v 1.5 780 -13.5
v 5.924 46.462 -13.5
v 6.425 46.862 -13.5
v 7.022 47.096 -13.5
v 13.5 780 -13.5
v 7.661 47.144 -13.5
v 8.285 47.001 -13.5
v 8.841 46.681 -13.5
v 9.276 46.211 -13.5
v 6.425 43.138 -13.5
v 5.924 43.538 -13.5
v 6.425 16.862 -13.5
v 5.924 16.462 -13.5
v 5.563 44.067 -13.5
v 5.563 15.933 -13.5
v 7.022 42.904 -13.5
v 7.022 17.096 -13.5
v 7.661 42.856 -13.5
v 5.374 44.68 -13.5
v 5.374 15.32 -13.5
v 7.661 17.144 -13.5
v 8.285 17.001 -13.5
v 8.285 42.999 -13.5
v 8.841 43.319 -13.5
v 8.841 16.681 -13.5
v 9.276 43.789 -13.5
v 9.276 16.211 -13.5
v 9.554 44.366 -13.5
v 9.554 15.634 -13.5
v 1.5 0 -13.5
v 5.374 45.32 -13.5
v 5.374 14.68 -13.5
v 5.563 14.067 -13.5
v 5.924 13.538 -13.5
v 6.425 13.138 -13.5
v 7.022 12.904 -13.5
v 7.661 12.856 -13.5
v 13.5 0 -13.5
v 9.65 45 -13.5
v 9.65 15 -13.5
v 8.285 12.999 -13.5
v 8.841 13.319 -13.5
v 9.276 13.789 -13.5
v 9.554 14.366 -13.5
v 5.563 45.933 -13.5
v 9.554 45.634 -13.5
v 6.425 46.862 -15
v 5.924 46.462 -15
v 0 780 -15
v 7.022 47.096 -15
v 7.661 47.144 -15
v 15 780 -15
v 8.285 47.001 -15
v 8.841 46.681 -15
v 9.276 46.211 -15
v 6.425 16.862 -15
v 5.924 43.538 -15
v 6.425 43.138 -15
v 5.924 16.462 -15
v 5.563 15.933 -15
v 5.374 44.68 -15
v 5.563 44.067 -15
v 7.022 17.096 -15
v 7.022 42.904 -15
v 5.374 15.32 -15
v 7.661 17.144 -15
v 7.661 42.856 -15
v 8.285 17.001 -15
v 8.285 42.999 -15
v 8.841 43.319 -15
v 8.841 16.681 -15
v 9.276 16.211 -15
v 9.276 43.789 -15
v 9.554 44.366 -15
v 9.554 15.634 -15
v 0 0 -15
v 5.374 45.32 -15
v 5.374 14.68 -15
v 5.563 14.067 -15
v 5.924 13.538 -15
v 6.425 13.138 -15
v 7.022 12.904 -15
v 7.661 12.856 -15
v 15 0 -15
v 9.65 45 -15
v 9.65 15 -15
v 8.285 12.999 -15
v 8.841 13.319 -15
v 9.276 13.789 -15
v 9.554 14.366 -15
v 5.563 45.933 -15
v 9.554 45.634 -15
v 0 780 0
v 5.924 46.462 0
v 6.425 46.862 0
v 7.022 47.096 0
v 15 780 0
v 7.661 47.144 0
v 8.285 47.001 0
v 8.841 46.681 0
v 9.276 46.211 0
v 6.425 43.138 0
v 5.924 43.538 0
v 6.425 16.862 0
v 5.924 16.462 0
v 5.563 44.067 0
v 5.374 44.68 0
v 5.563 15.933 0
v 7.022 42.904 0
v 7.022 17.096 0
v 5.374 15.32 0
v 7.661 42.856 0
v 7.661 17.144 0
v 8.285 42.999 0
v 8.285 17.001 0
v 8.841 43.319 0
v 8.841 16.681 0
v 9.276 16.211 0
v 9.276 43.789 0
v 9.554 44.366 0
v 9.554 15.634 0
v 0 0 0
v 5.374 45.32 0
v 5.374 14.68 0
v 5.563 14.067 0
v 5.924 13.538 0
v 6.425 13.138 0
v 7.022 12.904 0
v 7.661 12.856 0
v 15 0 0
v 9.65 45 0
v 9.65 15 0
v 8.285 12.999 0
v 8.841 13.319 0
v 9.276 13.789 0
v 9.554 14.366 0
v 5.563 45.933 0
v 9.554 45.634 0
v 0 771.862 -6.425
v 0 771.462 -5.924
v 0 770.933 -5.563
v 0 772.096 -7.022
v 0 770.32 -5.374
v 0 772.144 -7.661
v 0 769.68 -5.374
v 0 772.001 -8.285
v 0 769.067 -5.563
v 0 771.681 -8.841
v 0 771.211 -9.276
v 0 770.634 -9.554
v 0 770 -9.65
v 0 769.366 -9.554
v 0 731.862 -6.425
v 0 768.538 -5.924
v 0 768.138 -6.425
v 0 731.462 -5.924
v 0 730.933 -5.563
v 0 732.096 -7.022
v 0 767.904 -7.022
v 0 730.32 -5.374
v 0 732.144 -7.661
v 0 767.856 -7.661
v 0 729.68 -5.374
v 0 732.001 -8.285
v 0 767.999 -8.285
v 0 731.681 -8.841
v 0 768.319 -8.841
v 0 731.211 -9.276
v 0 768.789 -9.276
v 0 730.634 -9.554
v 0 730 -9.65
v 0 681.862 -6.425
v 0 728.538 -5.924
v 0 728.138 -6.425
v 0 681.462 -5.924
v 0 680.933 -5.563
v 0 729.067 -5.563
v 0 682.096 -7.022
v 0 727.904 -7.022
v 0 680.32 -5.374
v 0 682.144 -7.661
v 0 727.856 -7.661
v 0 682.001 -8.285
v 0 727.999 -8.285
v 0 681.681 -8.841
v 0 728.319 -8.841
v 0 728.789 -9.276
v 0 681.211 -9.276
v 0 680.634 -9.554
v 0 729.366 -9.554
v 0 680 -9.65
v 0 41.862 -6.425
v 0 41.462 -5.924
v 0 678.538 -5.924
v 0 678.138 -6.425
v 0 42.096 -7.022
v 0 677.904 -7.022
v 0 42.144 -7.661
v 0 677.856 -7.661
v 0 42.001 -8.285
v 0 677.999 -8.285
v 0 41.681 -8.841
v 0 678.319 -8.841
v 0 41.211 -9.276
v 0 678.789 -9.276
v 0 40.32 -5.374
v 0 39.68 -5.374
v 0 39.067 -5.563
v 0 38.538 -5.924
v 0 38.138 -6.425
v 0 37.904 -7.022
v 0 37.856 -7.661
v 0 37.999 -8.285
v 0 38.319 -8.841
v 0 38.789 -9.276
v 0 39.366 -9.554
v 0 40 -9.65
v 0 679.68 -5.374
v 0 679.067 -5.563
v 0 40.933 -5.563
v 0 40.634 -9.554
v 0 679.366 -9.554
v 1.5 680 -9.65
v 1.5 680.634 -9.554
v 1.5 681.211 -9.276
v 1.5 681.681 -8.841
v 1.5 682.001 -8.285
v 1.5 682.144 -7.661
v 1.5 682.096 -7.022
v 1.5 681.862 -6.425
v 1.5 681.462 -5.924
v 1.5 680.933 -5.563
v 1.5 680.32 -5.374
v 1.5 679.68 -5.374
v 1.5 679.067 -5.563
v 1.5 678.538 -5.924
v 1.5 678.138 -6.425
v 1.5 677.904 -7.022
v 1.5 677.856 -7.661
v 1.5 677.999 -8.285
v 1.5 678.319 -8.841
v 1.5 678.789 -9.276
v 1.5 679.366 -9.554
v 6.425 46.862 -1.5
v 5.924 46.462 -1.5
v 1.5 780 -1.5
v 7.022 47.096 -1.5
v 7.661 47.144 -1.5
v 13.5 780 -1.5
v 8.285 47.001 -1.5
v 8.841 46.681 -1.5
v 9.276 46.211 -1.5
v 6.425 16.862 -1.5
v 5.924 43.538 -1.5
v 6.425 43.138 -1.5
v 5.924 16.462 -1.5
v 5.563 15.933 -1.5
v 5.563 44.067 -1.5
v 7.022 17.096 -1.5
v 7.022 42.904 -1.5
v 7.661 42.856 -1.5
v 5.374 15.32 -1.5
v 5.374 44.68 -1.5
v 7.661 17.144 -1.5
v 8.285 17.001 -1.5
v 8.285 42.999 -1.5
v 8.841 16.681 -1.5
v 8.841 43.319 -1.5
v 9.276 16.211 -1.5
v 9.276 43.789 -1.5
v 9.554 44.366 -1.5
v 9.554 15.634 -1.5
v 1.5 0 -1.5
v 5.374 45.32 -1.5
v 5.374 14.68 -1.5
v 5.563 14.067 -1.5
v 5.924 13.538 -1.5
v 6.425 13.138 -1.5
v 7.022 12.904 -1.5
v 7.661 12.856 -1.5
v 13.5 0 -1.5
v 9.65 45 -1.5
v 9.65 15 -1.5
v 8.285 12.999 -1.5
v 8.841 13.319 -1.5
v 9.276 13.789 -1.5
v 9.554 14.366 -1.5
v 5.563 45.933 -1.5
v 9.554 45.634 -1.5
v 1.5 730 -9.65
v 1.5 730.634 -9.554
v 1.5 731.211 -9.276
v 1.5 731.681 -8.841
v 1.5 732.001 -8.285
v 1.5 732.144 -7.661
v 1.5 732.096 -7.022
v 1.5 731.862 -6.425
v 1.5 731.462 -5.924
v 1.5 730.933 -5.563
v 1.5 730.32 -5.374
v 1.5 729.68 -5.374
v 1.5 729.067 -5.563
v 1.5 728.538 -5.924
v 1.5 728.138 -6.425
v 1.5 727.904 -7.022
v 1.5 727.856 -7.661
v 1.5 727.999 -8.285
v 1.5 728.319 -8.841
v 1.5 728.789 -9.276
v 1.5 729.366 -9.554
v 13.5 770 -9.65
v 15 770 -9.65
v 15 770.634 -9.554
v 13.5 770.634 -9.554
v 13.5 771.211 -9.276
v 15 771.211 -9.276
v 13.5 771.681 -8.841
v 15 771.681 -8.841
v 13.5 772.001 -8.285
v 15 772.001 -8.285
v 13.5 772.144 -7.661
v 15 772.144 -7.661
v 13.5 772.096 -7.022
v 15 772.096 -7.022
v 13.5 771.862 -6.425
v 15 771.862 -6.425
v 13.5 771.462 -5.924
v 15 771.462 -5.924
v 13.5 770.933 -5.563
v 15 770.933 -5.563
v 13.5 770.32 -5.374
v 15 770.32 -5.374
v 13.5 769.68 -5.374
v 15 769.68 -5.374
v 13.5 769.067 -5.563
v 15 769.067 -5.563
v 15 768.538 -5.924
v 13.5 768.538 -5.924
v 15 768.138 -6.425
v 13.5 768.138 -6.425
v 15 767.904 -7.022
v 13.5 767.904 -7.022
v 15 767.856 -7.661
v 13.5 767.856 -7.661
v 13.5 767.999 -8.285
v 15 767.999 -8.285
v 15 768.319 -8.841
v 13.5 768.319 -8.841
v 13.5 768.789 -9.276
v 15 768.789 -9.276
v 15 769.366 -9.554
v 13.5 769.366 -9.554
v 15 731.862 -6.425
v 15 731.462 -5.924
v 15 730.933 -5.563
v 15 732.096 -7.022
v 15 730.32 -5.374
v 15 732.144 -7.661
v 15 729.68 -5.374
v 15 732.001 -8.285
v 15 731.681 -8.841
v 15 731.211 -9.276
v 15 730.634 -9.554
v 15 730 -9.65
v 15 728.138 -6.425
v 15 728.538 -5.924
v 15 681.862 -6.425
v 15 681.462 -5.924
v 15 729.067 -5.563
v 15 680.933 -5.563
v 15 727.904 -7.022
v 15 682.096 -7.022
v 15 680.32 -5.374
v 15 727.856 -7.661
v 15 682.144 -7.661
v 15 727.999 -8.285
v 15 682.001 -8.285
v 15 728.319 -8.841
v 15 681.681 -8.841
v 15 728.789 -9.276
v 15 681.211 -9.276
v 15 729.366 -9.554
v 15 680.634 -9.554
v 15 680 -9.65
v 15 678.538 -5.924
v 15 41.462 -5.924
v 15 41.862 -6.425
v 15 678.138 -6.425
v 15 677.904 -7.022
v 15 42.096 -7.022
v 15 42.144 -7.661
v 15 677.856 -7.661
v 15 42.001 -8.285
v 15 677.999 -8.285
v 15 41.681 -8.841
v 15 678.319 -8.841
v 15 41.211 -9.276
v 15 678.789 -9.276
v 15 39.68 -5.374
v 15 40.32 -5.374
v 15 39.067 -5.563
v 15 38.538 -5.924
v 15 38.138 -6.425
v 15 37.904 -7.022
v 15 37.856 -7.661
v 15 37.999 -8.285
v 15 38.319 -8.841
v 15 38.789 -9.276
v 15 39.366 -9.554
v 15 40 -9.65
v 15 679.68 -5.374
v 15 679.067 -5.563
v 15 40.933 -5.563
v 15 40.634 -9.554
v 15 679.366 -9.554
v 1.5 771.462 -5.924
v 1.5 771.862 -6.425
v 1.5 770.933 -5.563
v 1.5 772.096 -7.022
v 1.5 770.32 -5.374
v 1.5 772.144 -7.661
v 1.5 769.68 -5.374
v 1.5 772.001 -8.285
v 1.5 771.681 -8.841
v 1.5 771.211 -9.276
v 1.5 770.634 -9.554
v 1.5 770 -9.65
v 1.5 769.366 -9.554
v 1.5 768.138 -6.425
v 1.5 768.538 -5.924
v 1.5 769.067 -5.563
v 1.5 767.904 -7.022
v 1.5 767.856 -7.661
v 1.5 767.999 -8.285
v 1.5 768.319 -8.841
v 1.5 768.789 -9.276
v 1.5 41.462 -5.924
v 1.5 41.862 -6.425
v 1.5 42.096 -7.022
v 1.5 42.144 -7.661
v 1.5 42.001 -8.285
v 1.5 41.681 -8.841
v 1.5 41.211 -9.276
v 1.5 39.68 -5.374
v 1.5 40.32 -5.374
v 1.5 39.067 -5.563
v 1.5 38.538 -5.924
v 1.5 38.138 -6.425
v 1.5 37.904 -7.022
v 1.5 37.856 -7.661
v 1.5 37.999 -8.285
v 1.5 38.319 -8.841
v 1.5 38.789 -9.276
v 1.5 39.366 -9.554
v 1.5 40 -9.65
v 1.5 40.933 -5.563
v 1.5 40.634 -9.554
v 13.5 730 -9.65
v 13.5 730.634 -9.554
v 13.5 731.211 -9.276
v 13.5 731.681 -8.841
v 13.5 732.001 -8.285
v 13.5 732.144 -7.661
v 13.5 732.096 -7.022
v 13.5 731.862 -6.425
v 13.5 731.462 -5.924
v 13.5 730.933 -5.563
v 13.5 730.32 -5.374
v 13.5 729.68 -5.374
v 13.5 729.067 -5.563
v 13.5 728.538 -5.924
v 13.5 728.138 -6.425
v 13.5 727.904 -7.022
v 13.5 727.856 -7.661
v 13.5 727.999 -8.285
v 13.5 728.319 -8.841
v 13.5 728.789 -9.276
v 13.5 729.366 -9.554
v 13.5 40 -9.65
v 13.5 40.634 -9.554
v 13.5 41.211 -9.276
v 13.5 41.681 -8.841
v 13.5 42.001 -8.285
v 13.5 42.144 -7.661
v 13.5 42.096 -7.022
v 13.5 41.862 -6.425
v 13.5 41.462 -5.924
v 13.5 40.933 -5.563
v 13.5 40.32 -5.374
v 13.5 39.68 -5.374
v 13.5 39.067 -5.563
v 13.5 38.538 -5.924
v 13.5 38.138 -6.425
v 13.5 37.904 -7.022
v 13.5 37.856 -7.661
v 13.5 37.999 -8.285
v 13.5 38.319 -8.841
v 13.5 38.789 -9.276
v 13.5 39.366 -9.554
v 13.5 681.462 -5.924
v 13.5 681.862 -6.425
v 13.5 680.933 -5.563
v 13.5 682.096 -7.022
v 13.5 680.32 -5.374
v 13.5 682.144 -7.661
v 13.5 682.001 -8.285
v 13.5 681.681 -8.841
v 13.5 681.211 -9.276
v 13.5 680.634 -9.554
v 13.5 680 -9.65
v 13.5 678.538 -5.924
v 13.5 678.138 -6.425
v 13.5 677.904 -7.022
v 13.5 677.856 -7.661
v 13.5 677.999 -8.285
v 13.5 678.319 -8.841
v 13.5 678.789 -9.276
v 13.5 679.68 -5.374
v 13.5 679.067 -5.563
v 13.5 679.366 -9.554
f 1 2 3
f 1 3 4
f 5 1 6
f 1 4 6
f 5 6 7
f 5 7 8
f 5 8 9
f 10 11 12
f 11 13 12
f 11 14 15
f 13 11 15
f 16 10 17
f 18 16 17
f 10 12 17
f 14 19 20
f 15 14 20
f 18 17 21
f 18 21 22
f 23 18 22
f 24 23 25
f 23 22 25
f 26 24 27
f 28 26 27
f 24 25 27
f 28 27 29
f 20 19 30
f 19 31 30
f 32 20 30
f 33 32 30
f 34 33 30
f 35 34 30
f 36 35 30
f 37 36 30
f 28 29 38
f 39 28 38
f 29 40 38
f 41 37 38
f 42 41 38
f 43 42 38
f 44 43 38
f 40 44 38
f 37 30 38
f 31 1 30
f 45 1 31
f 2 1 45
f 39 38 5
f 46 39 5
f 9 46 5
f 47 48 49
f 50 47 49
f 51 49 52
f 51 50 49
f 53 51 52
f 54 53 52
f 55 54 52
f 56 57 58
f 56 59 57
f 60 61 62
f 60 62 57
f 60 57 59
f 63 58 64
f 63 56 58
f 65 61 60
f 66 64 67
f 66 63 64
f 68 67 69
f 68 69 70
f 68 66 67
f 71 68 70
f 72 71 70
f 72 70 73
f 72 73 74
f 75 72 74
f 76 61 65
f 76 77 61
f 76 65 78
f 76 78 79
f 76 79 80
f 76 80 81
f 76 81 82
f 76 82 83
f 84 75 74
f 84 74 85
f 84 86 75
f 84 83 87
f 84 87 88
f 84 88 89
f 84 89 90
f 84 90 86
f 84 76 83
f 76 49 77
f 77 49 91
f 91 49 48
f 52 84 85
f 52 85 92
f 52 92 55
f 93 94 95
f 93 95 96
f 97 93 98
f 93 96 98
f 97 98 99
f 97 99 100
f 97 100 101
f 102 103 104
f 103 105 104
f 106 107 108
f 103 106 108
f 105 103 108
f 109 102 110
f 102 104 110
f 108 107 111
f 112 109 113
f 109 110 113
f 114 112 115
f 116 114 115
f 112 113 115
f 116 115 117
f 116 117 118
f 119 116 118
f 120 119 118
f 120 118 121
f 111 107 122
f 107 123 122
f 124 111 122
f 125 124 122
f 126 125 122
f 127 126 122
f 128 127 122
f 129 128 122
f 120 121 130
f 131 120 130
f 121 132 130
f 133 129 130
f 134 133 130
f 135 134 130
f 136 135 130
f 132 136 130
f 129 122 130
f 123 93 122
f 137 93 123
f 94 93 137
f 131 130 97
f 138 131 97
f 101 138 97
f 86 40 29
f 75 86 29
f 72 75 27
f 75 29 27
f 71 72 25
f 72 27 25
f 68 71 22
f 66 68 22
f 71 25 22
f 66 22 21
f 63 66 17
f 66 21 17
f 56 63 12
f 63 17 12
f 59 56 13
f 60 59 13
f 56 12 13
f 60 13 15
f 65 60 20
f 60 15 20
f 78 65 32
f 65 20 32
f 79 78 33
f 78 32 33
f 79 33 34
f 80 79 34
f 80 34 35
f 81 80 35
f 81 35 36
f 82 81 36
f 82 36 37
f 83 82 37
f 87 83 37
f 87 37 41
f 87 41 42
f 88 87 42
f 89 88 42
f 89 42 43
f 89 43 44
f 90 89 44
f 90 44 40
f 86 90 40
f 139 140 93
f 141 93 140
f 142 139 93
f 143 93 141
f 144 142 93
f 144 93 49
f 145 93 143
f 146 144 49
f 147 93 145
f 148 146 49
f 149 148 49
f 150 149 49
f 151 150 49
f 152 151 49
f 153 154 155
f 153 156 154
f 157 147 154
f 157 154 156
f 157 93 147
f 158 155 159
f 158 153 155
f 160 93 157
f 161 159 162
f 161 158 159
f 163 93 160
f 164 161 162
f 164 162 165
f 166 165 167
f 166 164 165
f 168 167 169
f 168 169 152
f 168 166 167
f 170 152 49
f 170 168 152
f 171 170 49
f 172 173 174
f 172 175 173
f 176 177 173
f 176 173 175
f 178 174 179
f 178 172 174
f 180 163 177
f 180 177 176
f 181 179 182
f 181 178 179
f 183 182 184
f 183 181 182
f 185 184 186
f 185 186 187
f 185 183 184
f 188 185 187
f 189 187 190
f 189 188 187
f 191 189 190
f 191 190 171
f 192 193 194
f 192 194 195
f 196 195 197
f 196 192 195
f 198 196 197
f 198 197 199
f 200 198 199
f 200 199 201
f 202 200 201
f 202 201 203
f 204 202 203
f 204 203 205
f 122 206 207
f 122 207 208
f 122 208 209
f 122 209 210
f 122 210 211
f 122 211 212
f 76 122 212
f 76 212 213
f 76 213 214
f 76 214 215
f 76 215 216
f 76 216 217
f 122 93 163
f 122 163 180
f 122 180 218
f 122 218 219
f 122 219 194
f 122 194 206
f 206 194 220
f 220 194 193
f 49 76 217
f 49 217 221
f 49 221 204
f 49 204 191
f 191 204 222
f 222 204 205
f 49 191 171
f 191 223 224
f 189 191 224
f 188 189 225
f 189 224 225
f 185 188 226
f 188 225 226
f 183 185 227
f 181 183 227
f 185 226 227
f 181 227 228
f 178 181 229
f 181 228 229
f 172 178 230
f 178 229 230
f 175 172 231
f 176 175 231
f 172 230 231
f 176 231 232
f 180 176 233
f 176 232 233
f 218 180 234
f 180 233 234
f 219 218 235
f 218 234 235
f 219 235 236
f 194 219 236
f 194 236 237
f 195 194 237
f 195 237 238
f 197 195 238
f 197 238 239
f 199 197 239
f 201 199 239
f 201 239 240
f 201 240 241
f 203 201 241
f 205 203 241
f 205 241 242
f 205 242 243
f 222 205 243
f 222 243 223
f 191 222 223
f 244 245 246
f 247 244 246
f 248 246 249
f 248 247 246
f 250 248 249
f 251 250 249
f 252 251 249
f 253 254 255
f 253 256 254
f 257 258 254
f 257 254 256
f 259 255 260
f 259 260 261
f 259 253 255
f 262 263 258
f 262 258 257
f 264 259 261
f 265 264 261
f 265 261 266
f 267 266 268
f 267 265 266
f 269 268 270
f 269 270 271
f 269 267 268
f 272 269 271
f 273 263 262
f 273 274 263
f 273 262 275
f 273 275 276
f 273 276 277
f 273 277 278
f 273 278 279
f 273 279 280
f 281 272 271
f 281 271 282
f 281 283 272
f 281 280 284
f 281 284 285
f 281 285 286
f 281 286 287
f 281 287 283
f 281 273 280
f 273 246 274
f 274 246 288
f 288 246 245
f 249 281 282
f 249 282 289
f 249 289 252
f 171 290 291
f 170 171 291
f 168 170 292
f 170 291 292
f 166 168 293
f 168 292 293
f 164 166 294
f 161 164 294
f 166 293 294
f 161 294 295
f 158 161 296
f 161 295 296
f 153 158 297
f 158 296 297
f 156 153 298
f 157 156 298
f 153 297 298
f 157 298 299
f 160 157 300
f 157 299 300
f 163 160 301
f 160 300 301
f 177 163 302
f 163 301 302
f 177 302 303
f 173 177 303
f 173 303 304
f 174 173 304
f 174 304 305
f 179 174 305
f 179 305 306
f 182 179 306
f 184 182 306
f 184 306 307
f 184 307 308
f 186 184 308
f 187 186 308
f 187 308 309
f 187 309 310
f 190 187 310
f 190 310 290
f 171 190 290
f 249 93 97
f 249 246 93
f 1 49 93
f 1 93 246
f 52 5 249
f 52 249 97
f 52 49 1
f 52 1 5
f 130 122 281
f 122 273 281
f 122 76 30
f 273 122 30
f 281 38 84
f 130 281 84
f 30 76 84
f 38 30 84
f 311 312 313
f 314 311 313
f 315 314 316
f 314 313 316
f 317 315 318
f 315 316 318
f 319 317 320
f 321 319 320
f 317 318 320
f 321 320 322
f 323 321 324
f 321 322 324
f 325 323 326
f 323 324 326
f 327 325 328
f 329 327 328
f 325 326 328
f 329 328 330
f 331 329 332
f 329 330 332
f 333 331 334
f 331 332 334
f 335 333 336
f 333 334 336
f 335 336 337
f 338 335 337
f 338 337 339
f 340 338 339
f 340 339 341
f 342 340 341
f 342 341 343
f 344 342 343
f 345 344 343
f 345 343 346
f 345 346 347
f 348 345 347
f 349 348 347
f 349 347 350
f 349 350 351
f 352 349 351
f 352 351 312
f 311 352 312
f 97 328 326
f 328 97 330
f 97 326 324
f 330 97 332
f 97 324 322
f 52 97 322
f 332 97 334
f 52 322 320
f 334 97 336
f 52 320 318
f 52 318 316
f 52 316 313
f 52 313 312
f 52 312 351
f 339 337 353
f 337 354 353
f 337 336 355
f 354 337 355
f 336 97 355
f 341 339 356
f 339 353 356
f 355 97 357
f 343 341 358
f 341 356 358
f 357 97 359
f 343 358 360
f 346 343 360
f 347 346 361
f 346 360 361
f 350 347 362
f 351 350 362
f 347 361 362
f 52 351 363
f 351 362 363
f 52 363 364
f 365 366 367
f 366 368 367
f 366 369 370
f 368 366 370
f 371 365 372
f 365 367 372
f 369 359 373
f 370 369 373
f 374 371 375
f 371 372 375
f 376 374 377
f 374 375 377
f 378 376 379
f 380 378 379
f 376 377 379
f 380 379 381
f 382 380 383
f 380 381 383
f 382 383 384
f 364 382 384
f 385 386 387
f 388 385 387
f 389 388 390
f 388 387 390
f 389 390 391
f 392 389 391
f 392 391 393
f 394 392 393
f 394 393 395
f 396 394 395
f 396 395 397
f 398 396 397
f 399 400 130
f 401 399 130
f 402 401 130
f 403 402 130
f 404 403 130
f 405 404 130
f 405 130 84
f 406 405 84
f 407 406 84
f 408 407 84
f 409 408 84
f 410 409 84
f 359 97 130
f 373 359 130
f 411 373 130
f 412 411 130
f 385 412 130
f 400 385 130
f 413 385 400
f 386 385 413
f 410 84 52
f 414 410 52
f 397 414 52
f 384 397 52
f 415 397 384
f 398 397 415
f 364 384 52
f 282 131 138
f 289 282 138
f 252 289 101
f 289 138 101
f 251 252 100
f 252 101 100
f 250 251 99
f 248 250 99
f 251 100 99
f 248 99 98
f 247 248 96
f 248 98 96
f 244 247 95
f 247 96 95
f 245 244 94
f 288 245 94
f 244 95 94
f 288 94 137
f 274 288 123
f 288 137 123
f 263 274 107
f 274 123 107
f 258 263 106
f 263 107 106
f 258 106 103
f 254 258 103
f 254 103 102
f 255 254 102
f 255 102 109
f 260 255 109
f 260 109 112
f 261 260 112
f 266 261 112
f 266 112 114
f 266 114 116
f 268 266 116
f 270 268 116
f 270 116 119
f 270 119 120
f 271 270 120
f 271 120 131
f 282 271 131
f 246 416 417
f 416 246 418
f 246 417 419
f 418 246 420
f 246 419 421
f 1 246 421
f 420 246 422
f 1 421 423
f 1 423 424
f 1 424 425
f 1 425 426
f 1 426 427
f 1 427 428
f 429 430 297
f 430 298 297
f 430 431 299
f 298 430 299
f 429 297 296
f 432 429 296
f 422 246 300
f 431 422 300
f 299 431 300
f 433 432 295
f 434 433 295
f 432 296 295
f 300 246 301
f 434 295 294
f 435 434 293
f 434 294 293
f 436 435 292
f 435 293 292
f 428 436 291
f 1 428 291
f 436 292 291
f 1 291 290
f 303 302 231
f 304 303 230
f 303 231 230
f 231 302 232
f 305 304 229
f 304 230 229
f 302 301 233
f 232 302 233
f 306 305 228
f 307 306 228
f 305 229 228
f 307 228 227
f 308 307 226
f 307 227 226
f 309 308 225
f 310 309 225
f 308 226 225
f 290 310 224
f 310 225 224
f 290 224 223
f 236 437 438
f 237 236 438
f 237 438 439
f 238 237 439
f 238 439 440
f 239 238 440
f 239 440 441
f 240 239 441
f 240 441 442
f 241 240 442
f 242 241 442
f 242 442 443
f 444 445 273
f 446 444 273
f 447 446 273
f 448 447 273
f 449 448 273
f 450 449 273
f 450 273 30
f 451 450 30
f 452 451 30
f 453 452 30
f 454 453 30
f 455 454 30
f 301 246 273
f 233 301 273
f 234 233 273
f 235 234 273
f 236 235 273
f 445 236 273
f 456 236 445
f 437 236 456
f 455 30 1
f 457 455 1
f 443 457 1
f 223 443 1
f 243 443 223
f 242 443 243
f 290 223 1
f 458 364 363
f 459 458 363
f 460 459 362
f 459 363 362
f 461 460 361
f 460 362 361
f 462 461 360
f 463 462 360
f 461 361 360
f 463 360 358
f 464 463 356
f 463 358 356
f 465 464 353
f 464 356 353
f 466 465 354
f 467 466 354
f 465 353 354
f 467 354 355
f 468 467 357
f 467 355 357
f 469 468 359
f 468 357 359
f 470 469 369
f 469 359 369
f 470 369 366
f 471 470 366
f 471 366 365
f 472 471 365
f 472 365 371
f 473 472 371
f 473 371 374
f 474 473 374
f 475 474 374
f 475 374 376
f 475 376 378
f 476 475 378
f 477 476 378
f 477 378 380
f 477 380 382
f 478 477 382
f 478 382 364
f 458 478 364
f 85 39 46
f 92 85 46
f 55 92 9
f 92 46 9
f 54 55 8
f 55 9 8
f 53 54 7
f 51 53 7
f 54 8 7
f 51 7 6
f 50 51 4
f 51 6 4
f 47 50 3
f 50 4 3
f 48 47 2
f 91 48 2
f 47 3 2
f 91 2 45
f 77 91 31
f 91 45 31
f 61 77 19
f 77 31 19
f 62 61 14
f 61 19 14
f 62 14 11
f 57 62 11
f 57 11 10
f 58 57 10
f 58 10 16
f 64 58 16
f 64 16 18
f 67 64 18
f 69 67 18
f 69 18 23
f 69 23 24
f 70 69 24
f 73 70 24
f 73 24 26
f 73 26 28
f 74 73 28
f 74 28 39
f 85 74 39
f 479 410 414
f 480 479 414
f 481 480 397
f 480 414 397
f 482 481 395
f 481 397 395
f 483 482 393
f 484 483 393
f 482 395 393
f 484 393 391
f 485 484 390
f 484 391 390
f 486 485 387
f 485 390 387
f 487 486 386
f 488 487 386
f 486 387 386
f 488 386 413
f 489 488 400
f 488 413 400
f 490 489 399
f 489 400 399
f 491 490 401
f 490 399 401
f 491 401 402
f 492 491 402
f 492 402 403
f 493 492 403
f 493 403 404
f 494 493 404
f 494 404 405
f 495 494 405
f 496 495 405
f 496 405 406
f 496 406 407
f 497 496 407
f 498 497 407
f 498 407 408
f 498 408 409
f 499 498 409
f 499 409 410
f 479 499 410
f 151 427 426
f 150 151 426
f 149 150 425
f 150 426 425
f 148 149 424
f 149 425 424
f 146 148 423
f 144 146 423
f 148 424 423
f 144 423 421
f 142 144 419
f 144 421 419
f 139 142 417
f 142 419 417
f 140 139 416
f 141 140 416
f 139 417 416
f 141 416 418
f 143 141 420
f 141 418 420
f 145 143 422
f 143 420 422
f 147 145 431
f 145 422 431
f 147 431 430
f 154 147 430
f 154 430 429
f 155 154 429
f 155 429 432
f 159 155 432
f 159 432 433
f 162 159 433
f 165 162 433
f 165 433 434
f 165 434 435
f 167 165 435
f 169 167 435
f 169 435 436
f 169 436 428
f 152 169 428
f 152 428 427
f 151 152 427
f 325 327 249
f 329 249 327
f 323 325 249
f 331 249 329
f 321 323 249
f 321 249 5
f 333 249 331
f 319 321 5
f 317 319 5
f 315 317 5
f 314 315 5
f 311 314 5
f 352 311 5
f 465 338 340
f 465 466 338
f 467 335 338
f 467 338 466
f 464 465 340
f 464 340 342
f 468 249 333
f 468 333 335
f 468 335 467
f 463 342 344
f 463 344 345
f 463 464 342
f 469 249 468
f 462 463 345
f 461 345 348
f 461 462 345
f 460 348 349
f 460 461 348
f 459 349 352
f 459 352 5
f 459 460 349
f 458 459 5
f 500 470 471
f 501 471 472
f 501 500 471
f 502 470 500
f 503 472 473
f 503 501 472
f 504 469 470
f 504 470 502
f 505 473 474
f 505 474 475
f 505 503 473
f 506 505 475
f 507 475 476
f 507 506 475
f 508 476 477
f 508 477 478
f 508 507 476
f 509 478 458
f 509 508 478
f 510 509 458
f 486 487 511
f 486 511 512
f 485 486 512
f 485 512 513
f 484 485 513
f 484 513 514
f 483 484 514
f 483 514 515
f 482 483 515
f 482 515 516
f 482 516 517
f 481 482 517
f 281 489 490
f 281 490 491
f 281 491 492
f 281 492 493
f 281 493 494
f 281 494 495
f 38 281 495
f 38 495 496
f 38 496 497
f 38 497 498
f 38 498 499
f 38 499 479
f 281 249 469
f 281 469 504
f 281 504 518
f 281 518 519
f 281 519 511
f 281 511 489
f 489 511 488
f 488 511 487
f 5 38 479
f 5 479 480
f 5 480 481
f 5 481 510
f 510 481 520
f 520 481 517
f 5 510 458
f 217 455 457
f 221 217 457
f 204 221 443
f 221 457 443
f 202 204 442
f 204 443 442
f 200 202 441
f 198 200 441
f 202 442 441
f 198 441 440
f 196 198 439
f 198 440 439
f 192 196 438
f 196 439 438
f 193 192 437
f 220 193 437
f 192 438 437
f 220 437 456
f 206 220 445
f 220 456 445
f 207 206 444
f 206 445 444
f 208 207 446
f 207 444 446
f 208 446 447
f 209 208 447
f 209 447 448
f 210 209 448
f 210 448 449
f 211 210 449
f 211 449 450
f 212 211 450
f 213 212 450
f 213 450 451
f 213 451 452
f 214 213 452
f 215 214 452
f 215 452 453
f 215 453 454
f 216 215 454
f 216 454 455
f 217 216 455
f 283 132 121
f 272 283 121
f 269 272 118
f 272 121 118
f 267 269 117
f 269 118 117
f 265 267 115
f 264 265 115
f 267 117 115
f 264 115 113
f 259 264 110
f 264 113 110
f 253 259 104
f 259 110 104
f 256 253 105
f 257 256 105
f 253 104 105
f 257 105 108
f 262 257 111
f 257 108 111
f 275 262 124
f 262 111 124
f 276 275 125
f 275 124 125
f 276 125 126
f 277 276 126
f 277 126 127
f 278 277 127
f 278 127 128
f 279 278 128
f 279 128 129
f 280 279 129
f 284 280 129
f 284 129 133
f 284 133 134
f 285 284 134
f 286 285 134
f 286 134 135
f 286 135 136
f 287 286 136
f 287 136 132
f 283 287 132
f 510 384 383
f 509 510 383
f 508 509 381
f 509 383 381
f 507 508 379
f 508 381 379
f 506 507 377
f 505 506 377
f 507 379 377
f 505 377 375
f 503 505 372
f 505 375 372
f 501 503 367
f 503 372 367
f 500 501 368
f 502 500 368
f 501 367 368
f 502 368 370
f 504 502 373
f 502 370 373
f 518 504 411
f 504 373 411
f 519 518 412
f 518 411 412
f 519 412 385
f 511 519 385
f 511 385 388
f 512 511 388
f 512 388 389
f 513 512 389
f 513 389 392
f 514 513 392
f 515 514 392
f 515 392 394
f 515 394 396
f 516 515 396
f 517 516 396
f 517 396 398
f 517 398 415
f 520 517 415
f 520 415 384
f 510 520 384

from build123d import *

# Parameters (mm, degrees)
SKETCH_1_W          = 15
SKETCH_1_H          = 15
SKETCH_1_W_2        = 12
SKETCH_1_H_2        = 12
EXTRUDE_1_DEPTH     = 780
CUT_EXTRUDE_1_REACH = 782.288
SKETCH_2_R          = 2.15
CUT_EXTRUDE_2_REACH = 782.288
SKETCH_4_R          = 2.15


with BuildPart() as part:
    # ｽｹｯﾁ1 → 押し出し-薄板1 (new body)
    with BuildSketch(Plane(origin=(0, 0, 0), x_dir=(1, 0, 0), z_dir=(0, 1, 0))):
        with Locations((7.5, 7.5)):
            Rectangle(SKETCH_1_W, SKETCH_1_H)
        with Locations((7.5, 7.5)):
            Rectangle(SKETCH_1_W_2, SKETCH_1_H_2, mode=Mode.SUBTRACT)
    extrude(amount=EXTRUDE_1_DEPTH)

    # ｶｯﾄ - 押し出し1: up to this face of the body (flat: up to its plane)
    cut_extrude_1_end = Plane(part.part.faces().sort_by_distance((0, 390, -7.5))[0])
    # ｽｹｯﾁ2 → ｶｯﾄ - 押し出し1 (cut, up to the picked face)
    with BuildSketch(Plane(origin=(15, 0, 0), x_dir=(0, 0, -1), z_dir=(1, 0, 0)), mode=Mode.PRIVATE) as cut_extrude_1_sk1:
        with Locations((7.5, 730)):
            Circle(SKETCH_2_R)
    cut_extrude_1_tool1 = split(extrude(cut_extrude_1_sk1.sketch, amount=-CUT_EXTRUDE_1_REACH, mode=Mode.PRIVATE), bisect_by=cut_extrude_1_end, keep=Keep.BOTH, mode=Mode.PRIVATE)
    # ｽｹｯﾁ2 → ｶｯﾄ - 押し出し1 (cut, up to the picked face)
    with BuildSketch(Plane(origin=(15, 0, 0), x_dir=(0, 0, -1), z_dir=(1, 0, 0)), mode=Mode.PRIVATE) as cut_extrude_1_sk2:
        with Locations((7.5, 680)):
            Circle(SKETCH_2_R)
    cut_extrude_1_tool2 = split(extrude(cut_extrude_1_sk2.sketch, amount=-CUT_EXTRUDE_1_REACH, mode=Mode.PRIVATE), bisect_by=cut_extrude_1_end, keep=Keep.BOTH, mode=Mode.PRIVATE)
    # ｽｹｯﾁ2 → ｶｯﾄ - 押し出し1 (cut, up to the picked face)
    with BuildSketch(Plane(origin=(15, 0, 0), x_dir=(0, 0, -1), z_dir=(1, 0, 0)), mode=Mode.PRIVATE) as cut_extrude_1_sk3:
        with Locations((7.5, 40)):
            Circle(SKETCH_2_R)
    cut_extrude_1_tool3 = split(extrude(cut_extrude_1_sk3.sketch, amount=-CUT_EXTRUDE_1_REACH, mode=Mode.PRIVATE), bisect_by=cut_extrude_1_end, keep=Keep.BOTH, mode=Mode.PRIVATE)
    # ｽｹｯﾁ2 → ｶｯﾄ - 押し出し1 (cut, up to the picked face)
    with BuildSketch(Plane(origin=(15, 0, 0), x_dir=(0, 0, -1), z_dir=(1, 0, 0)), mode=Mode.PRIVATE) as cut_extrude_1_sk4:
        with Locations((7.5, 770)):
            Circle(SKETCH_2_R)
    cut_extrude_1_tool4 = split(extrude(cut_extrude_1_sk4.sketch, amount=-CUT_EXTRUDE_1_REACH, mode=Mode.PRIVATE), bisect_by=cut_extrude_1_end, keep=Keep.BOTH, mode=Mode.PRIVATE)
    add(cut_extrude_1_tool1.solids().sort_by(Axis((15, 730, -7.5), (-1, 0, 0)))[0], mode=Mode.SUBTRACT)
    add(cut_extrude_1_tool2.solids().sort_by(Axis((15, 680, -7.5), (-1, 0, 0)))[0], mode=Mode.SUBTRACT)
    add(cut_extrude_1_tool3.solids().sort_by(Axis((15, 40, -7.5), (-1, 0, 0)))[0], mode=Mode.SUBTRACT)
    add(cut_extrude_1_tool4.solids().sort_by(Axis((15, 770, -7.5), (-1, 0, 0)))[0], mode=Mode.SUBTRACT)

    # ｶｯﾄ - 押し出し2: up to this face of the body (flat: up to its plane)
    cut_extrude_2_end = Plane(part.part.faces().sort_by_distance((7.5, 390, -15))[0])
    # ｽｹｯﾁ4 → ｶｯﾄ - 押し出し2 (cut, up to the picked face)
    with BuildSketch(Plane.XY, mode=Mode.PRIVATE) as cut_extrude_2_sk1:
        with Locations((7.5, 15)):
            Circle(SKETCH_4_R)
    cut_extrude_2_tool1 = split(extrude(cut_extrude_2_sk1.sketch, amount=-CUT_EXTRUDE_2_REACH, mode=Mode.PRIVATE), bisect_by=cut_extrude_2_end, keep=Keep.BOTH, mode=Mode.PRIVATE)
    # ｽｹｯﾁ4 → ｶｯﾄ - 押し出し2 (cut, up to the picked face)
    with BuildSketch(Plane.XY, mode=Mode.PRIVATE) as cut_extrude_2_sk2:
        with Locations((7.5, 45)):
            Circle(SKETCH_4_R)
    cut_extrude_2_tool2 = split(extrude(cut_extrude_2_sk2.sketch, amount=-CUT_EXTRUDE_2_REACH, mode=Mode.PRIVATE), bisect_by=cut_extrude_2_end, keep=Keep.BOTH, mode=Mode.PRIVATE)
    add(cut_extrude_2_tool1.solids().sort_by(Axis((7.5, 15, 0), (0, 0, -1)))[0], mode=Mode.SUBTRACT)
    add(cut_extrude_2_tool2.solids().sort_by(Axis((7.5, 45, 0), (0, 0, -1)))[0], mode=Mode.SUBTRACT)


solid = part.part
